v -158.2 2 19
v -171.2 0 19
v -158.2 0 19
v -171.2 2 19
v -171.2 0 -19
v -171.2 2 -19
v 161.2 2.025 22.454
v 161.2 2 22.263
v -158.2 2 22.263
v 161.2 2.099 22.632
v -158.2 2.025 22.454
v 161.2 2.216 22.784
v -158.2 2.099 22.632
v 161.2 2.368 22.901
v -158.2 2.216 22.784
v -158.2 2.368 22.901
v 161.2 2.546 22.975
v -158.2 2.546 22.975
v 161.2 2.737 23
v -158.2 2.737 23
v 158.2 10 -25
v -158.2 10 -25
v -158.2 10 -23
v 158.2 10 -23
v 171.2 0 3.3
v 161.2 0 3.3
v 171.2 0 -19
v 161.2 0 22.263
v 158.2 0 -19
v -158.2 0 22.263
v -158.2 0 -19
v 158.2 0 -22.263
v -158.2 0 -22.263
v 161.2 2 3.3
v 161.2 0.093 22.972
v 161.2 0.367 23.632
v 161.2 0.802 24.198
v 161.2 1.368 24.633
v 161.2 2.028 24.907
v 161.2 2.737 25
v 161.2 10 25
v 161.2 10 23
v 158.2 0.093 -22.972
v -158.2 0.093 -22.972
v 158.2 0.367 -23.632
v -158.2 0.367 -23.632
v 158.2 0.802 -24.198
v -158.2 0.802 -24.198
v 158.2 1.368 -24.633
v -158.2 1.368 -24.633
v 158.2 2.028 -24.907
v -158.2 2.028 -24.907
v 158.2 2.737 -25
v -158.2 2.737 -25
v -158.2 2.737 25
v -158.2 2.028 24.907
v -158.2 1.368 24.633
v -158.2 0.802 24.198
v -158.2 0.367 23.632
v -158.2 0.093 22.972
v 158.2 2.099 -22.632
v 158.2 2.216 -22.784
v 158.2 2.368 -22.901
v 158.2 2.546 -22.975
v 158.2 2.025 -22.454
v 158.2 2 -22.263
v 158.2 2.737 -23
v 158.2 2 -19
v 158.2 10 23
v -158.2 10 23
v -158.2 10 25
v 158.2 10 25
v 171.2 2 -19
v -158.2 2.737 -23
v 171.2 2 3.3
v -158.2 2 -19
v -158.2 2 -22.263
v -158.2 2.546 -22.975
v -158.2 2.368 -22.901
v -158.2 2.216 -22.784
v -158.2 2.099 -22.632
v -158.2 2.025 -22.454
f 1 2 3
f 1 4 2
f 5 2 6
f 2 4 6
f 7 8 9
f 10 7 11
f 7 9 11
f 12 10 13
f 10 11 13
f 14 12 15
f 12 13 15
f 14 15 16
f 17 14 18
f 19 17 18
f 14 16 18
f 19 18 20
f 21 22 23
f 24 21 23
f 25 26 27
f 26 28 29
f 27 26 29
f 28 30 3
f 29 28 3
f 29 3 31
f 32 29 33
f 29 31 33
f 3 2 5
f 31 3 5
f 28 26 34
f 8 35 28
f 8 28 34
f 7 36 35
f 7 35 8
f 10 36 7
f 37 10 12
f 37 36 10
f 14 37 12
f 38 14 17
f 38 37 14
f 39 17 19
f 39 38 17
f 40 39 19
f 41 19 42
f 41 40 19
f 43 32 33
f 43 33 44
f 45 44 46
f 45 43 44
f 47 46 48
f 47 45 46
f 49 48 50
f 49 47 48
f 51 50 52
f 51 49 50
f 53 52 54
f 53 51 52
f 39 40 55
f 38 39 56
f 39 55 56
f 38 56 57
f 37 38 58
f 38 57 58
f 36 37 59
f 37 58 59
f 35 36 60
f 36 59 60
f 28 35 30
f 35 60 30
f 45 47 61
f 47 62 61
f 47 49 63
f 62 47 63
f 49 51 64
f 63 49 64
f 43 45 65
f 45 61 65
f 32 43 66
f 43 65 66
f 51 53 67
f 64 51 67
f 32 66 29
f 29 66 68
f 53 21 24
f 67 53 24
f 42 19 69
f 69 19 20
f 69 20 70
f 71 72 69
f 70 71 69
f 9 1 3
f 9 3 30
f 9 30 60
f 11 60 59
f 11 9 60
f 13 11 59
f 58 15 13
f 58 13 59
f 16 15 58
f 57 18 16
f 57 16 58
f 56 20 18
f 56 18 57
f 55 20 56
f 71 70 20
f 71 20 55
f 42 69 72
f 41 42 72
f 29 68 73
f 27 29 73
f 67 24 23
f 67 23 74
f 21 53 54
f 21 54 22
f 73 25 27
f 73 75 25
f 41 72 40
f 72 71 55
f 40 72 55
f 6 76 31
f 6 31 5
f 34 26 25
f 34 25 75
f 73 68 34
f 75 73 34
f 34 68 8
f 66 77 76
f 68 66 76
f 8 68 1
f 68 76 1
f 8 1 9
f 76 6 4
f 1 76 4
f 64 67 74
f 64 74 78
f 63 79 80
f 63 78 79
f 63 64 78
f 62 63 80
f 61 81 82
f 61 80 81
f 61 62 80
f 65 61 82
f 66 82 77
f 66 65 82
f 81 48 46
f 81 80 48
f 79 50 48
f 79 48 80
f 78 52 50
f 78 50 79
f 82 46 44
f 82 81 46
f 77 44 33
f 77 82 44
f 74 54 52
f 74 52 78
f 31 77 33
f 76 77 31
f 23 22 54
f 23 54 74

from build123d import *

# Parameters (mm, degrees)
SKETCH1_W                    = 342.4
SKETCH1_H                    = 50
BASE_FLANGE1_DEPTH           = 2
EDGE_FLANGE1_STRIP_W         = 9.4732
EDGE_FLANGE1_STRIP_H         = 2
EDGE_FLANGE1_STRIP_CUT_DEPTH = 342.4
EDGE_FLANGE1_DEPTH           = 342.4
EDGE_FLANGE2_STRIP_W         = 9.4732
EDGE_FLANGE2_STRIP_H         = 2
EDGE_FLANGE2_STRIP_CUT_DEPTH = 342.4
EDGE_FLANGE2_DEPTH           = 342.4
CUT_EXTRUDE2_DEPTH           = 334.488770426
CUT_EXTRUDE3_DEPTH           = 174.200577366
MOVE_START                   = 158.2
MOVE_FACE1_DEPTH             = 3


# Read off the part's stored shape, not the designer's step: Move Face1
# Sheet-metal steps are written as plain solids
with BuildPart() as part:
    # Sketch1 → Base-Flange1 (new body)
    with BuildSketch(Plane(origin=(0, 0, 0), x_dir=(1, 0, 0), z_dir=(0, 1, 0))):
        Rectangle(SKETCH1_W, SKETCH1_H)
    extrude(amount=BASE_FLANGE1_DEPTH)

    # Edge-Flange1 strip (across the edge) → Edge-Flange1 strip cut (cut)
    with BuildSketch(Plane(origin=(-171.2, 2, 25), x_dir=(0, 0, -1), z_dir=(1, 0, 0))):
        with Locations((-2, -1)):
            Rectangle(EDGE_FLANGE1_STRIP_W, EDGE_FLANGE1_STRIP_H)
    extrude(amount=EDGE_FLANGE1_STRIP_CUT_DEPTH, mode=Mode.SUBTRACT)

    # Edge-Flange1 section (across the edge) → Edge-Flange1 (add)
    with BuildSketch(Plane(origin=(-171.2, 2, 25), x_dir=(0, 0, -1), z_dir=(1, 0, 0))):
        with BuildLine():
            Line((0, 0.7366), (0, 8))
            Line((0, 8), (2, 8))
            Line((2, 8), (2, 0.7366))
            ThreePointArc((2, 0.7366), (2.215745145, 0.215745145), (2.7366, 0))
            Line((2.7366, 0), (2.7366, -2))
            ThreePointArc((2.7366, -2), (0.801531583, -1.198468417), (0, 0.7366))
        make_face()
    extrude(amount=EDGE_FLANGE1_DEPTH)

    # Edge-Flange2 strip (across the edge) → Edge-Flange2 strip cut (cut)
    with BuildSketch(Plane(origin=(171.2, 2, -25), x_dir=(0, 0, 1), z_dir=(-1, 0, 0))):
        with Locations((-2, -1)):
            Rectangle(EDGE_FLANGE2_STRIP_W, EDGE_FLANGE2_STRIP_H)
    extrude(amount=EDGE_FLANGE2_STRIP_CUT_DEPTH, mode=Mode.SUBTRACT)

    # Edge-Flange2 section (across the edge) → Edge-Flange2 (add)
    with BuildSketch(Plane(origin=(171.2, 2, -25), x_dir=(0, 0, 1), z_dir=(-1, 0, 0))):
        with BuildLine():
            Line((0, 0.7366), (0, 8))
            Line((0, 8), (2, 8))
            Line((2, 8), (2, 0.7366))
            ThreePointArc((2, 0.7366), (2.215745145, 0.215745145), (2.7366, 0))
            Line((2.7366, 0), (2.7366, -2))
            ThreePointArc((2.7366, -2), (0.801531583, -1.198468417), (0, 0.7366))
        make_face()
    extrude(amount=EDGE_FLANGE2_DEPTH)

    # Sketch18 → Cut-Extrude2 (cut, through all)
    with BuildSketch(Plane(origin=(161.2, 0, 0), x_dir=(0, 0, -1), z_dir=(1, 0, 0))):
        Polygon((-3.3, 6.000000001), (-3.3, 10.000000001), (-37.658134746, 10.000000001), (-37.658134746, -5.535311506), (-3.3, -5.535311506), align=None)
    extrude(amount=CUT_EXTRUDE2_DEPTH, mode=Mode.SUBTRACT)

    # Sketch19 → Cut-Extrude3 (cut, symmetric)
    with BuildSketch(Plane(origin=(0, 2, 0), x_dir=(1, 0, 0), z_dir=(0, 1, 0))):
        Polygon((-249.45231786, 85.285820153), (-158.2, 85.285820153), (-158.2, 19), (-209.845513649, 19), (-209.845513649, -19), (-158.2, -19), (-158.2, -89.848436046), (-249.45231786, -89.848436046), align=None)
    cut_extrude3 = extrude(amount=CUT_EXTRUDE3_DEPTH, both=True, mode=Mode.SUBTRACT)

    # Mirror1: Cut-Extrude3 across plane
    add(cut_extrude3.mirror(Plane(origin=(0, 0, 0), x_dir=(0, 0, 1), z_dir=(1, 0, 0))), mode=Mode.SUBTRACT)

    # Move Face1 outline → Move Face1 (add)
    with BuildSketch(Plane.YZ.offset(MOVE_START)):
        with BuildLine():
            Line((0, 19), (2, 19))
            Line((2, 19), (2, 22.2634))
            ThreePointArc((2, 22.2634), (2.215745145, 22.784254855), (2.7366, 23))
            Line((2.7366, 23), (10.000000001, 23))
            Line((10.000000001, 23), (10, 25))
            Line((10, 25), (2.7366, 25))
            ThreePointArc((2.7366, 25), (0.801531583, 24.198468417), (0, 22.2634))
            Line((0, 22.2634), (0, 19))
        make_face()
    extrude(amount=MOVE_FACE1_DEPTH)


solid = part.part
